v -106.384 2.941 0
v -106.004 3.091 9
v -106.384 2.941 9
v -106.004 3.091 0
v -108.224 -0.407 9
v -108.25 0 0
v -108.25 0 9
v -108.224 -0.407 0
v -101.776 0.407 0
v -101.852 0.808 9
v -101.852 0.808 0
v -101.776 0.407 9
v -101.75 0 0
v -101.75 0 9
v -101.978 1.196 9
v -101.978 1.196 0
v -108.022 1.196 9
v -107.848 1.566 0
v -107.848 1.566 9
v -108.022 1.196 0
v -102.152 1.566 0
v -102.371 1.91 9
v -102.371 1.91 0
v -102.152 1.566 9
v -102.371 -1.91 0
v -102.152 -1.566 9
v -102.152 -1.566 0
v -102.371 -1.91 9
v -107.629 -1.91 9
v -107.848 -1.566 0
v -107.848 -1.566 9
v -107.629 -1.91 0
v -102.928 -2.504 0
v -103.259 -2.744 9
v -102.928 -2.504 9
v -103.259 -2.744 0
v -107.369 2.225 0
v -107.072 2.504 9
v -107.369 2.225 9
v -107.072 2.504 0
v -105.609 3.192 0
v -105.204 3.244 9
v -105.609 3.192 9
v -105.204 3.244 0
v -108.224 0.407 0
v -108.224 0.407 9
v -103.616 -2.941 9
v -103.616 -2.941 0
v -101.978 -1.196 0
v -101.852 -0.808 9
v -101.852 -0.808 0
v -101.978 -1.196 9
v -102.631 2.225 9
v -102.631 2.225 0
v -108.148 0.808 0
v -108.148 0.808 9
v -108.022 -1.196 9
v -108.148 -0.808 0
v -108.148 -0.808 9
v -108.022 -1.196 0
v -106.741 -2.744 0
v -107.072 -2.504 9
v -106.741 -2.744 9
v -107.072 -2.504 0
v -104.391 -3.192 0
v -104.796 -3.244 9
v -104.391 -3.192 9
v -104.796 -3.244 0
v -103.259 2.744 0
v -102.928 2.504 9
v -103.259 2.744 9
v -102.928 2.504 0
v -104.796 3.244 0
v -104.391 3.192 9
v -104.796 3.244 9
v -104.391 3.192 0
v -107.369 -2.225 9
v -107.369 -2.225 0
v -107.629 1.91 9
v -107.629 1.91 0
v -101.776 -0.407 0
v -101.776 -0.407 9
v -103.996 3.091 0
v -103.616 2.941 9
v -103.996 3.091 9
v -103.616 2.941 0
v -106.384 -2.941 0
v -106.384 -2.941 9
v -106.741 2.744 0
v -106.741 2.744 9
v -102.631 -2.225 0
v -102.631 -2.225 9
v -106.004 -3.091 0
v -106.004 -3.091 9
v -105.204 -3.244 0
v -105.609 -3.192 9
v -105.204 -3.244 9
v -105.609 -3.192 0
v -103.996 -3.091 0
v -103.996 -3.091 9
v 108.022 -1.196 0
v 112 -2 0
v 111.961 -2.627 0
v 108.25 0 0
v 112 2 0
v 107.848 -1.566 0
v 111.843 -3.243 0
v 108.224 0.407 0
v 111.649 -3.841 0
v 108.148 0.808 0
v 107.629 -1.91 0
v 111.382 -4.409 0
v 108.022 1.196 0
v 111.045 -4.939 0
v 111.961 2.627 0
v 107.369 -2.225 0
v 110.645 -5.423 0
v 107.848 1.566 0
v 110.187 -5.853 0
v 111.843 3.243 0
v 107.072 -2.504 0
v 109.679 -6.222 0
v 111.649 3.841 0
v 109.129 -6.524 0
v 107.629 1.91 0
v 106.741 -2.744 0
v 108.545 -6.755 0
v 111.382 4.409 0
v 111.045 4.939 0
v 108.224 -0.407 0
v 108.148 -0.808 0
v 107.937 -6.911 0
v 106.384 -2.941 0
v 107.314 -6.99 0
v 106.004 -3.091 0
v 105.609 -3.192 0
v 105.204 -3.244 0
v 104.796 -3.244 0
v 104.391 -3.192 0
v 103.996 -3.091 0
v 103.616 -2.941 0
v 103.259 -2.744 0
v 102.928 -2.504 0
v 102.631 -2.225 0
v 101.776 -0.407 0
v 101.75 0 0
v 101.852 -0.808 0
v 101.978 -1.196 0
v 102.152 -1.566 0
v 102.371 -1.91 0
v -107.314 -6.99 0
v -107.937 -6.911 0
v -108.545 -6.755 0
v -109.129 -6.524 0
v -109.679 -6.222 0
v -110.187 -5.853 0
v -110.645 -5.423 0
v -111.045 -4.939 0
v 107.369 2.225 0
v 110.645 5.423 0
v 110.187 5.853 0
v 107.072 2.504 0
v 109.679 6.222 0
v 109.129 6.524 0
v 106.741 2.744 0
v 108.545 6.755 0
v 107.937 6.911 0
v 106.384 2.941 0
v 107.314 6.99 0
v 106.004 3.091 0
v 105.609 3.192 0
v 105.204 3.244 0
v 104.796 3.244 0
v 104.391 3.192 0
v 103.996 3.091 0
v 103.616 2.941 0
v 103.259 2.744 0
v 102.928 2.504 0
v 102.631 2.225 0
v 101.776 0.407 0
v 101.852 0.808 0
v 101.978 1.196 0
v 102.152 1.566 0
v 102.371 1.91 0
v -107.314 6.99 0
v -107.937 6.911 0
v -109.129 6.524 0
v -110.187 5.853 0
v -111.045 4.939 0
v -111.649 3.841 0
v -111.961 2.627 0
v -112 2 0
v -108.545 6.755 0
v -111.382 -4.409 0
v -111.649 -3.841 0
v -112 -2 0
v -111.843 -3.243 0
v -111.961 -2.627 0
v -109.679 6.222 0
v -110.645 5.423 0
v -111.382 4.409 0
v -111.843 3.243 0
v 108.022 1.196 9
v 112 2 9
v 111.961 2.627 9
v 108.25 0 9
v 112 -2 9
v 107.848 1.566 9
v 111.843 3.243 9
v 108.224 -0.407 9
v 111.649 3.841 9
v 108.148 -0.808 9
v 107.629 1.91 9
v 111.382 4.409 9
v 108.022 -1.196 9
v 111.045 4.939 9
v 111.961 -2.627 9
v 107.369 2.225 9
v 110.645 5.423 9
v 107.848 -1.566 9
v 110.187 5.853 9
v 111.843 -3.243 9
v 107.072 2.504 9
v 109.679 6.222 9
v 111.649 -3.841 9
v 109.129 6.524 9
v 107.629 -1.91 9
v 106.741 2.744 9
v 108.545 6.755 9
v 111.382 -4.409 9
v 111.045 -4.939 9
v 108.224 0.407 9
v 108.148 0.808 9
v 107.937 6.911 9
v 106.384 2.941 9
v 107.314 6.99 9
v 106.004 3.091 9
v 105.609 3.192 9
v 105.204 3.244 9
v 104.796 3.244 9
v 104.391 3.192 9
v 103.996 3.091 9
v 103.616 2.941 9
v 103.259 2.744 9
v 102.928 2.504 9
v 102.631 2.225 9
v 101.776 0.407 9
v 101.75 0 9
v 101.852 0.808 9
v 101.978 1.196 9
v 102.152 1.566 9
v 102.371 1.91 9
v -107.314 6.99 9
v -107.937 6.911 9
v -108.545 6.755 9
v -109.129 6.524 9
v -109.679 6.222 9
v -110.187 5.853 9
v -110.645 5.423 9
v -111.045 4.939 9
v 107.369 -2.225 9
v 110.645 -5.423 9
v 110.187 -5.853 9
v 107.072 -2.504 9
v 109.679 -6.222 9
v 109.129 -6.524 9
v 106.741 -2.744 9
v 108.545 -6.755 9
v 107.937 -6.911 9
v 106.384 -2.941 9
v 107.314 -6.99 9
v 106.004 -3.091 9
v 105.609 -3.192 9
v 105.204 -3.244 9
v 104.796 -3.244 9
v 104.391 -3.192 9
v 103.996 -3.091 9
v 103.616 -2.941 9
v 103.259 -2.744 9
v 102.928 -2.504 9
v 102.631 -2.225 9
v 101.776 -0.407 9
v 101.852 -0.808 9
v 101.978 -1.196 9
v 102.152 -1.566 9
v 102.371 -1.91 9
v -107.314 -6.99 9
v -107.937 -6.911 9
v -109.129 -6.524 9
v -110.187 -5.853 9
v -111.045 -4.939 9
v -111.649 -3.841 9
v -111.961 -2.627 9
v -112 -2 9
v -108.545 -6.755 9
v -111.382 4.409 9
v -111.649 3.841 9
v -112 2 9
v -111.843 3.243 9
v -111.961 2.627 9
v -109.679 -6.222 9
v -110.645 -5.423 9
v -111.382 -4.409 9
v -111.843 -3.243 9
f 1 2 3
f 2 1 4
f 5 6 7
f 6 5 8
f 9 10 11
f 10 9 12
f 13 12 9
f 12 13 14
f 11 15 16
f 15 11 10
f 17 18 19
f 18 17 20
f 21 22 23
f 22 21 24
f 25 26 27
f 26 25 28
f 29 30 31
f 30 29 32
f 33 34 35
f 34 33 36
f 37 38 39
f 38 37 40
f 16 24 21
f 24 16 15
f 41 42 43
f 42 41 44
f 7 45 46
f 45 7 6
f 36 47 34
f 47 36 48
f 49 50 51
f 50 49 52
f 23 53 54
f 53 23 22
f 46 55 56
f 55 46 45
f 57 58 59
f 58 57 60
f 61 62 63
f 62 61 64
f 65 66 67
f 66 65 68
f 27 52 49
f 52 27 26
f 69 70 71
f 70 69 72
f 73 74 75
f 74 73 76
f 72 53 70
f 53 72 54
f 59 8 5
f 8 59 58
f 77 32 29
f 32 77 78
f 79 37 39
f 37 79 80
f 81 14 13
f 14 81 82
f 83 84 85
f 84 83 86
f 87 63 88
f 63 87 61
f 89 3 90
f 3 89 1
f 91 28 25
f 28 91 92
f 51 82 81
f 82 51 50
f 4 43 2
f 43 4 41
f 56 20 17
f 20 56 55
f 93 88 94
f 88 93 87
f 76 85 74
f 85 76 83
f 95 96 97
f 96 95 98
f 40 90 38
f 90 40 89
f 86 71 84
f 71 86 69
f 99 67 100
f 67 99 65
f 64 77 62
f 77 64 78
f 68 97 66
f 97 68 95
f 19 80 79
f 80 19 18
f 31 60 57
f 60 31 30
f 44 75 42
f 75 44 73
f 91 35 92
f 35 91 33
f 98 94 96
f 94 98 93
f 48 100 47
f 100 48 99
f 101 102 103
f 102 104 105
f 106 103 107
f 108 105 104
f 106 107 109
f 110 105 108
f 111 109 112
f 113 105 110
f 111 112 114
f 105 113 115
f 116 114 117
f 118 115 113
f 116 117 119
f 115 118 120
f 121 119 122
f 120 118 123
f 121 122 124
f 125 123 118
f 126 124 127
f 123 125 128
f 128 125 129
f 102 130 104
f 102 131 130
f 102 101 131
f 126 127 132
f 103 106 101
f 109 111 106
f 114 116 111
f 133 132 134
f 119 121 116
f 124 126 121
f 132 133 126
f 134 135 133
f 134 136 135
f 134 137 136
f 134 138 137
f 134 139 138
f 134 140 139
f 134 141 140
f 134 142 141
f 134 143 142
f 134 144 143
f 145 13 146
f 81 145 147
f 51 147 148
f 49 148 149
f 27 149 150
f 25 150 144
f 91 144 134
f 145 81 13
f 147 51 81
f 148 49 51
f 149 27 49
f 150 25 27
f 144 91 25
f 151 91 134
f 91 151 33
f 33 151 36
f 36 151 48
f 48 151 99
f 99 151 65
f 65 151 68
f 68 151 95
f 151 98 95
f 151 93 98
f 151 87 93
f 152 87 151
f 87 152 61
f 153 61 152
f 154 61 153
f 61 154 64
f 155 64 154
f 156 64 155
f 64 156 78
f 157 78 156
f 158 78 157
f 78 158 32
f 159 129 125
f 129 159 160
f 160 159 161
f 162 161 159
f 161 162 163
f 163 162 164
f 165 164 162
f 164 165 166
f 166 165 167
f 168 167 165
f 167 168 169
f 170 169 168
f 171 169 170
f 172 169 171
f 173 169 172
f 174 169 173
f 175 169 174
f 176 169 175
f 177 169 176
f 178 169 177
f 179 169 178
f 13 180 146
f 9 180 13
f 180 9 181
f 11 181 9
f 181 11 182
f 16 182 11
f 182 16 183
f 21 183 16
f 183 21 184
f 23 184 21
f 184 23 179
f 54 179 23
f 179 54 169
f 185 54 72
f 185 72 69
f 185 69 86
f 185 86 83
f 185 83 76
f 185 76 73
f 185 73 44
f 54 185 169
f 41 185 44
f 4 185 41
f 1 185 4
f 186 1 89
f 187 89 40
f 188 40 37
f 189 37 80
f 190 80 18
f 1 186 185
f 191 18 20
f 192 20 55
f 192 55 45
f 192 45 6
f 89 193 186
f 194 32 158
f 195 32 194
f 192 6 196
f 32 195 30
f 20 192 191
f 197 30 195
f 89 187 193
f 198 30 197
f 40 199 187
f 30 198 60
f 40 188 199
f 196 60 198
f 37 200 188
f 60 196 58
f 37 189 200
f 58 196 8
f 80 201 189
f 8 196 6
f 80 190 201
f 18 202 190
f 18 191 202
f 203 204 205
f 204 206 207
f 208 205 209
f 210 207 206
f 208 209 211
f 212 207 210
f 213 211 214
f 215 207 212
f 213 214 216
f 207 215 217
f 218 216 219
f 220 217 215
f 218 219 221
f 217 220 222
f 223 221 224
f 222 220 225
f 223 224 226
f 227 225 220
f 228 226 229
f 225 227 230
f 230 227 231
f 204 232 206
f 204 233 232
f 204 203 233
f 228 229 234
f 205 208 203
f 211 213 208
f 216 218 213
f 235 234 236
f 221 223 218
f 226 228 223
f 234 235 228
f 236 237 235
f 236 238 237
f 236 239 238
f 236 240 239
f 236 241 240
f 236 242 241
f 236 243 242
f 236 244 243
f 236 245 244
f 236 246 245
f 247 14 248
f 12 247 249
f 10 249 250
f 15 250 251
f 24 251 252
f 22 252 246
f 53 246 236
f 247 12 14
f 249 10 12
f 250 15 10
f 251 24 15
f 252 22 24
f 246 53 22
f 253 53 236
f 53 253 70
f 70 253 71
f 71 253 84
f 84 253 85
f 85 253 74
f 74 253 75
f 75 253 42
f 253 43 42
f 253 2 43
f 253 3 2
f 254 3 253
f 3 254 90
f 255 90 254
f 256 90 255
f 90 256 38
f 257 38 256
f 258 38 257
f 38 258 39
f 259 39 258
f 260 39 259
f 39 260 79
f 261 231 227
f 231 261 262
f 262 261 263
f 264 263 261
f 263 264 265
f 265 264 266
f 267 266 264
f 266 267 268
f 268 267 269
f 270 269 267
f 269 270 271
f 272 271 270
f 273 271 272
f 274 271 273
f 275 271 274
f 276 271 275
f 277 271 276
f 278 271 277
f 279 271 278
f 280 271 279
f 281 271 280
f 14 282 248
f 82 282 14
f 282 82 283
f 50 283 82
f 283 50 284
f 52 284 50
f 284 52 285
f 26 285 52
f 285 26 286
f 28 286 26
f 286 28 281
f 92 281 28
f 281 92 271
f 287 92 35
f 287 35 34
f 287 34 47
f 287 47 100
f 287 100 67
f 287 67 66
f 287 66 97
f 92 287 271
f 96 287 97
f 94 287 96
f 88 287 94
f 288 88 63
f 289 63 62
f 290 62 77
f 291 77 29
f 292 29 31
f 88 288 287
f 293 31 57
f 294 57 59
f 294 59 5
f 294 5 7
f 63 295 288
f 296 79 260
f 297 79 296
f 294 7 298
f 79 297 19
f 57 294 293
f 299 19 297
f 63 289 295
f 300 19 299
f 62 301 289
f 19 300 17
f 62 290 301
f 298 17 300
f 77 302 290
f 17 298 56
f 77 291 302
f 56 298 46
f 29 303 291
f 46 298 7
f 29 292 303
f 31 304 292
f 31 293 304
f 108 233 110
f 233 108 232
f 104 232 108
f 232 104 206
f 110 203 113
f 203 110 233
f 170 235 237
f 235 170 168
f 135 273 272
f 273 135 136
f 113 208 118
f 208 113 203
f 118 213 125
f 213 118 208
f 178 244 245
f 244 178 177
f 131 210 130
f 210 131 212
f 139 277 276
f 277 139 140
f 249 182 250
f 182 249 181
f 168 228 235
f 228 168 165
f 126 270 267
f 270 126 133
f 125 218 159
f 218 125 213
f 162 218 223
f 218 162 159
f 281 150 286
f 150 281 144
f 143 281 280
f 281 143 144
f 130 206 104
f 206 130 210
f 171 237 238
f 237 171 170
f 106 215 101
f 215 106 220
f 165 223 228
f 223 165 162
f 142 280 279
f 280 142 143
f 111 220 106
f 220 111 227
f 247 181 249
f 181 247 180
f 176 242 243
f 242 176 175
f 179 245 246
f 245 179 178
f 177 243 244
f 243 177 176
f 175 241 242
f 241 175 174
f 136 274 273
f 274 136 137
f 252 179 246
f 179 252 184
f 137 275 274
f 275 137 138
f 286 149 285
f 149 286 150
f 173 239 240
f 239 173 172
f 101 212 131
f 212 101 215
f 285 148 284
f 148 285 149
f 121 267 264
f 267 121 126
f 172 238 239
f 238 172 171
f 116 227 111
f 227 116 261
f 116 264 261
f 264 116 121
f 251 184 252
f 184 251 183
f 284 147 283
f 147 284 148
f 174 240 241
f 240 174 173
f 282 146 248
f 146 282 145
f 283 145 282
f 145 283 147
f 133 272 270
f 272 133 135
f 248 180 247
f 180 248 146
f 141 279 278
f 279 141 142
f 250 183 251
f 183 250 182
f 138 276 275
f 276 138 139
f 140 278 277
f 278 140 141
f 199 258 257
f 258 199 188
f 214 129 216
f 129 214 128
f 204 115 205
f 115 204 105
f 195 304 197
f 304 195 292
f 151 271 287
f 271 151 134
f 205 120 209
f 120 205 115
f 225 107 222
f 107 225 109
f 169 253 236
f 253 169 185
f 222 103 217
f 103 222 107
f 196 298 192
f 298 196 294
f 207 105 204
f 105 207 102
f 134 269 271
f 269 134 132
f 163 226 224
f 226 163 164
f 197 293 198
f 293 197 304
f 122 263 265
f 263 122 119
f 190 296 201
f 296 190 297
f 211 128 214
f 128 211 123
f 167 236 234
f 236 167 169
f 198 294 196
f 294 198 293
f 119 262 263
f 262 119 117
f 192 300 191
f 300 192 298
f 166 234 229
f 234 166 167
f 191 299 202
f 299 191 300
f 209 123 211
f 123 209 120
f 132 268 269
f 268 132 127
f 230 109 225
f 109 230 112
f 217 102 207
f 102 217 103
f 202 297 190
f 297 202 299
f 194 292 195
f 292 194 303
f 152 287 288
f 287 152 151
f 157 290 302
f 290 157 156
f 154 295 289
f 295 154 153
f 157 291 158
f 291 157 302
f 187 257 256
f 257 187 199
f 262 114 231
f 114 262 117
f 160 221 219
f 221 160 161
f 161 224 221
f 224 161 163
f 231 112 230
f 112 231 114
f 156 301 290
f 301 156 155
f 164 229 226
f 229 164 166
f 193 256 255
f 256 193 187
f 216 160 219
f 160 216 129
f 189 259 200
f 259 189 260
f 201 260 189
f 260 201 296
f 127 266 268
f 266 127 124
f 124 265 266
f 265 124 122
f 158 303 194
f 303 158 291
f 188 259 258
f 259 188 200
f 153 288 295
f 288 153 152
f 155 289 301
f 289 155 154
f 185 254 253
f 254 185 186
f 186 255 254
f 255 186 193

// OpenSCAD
$fn = 50;


difference() {
	union() {
		hull() {
			translate(v = [-107.0000000000, 2.0000000000, 0]) {
				cylinder(h = 9, r = 5);
			}
			translate(v = [107.0000000000, 2.0000000000, 0]) {
				cylinder(h = 9, r = 5);
			}
			translate(v = [-107.0000000000, -2.0000000000, 0]) {
				cylinder(h = 9, r = 5);
			}
			translate(v = [107.0000000000, -2.0000000000, 0]) {
				cylinder(h = 9, r = 5);
			}
		}
	}
	union() {
		translate(v = [-105.0000000000, 0.0000000000, 0]) {
			cylinder(h = 9, r = 3.2500000000);
		}
		translate(v = [105.0000000000, 0.0000000000, 0]) {
			cylinder(h = 9, r = 3.2500000000);
		}
		translate(v = [-105.0000000000, 0.0000000000, 0]) {
			cylinder(h = 9, r = 1.8000000000);
		}
		translate(v = [105.0000000000, 0.0000000000, 0]) {
			cylinder(h = 9, r = 1.8000000000);
		}
		translate(v = [-105.0000000000, 0.0000000000, 0]) {
			cylinder(h = 9, r = 1.8000000000);
		}
		translate(v = [105.0000000000, 0.0000000000, 0]) {
			cylinder(h = 9, r = 1.8000000000);
		}
		translate(v = [-105.0000000000, 0.0000000000, 0]) {
			cylinder(h = 9, r = 1.8000000000);
		}
		translate(v = [105.0000000000, 0.0000000000, 0]) {
			cylinder(h = 9, r = 1.8000000000);
		}
	}
}
